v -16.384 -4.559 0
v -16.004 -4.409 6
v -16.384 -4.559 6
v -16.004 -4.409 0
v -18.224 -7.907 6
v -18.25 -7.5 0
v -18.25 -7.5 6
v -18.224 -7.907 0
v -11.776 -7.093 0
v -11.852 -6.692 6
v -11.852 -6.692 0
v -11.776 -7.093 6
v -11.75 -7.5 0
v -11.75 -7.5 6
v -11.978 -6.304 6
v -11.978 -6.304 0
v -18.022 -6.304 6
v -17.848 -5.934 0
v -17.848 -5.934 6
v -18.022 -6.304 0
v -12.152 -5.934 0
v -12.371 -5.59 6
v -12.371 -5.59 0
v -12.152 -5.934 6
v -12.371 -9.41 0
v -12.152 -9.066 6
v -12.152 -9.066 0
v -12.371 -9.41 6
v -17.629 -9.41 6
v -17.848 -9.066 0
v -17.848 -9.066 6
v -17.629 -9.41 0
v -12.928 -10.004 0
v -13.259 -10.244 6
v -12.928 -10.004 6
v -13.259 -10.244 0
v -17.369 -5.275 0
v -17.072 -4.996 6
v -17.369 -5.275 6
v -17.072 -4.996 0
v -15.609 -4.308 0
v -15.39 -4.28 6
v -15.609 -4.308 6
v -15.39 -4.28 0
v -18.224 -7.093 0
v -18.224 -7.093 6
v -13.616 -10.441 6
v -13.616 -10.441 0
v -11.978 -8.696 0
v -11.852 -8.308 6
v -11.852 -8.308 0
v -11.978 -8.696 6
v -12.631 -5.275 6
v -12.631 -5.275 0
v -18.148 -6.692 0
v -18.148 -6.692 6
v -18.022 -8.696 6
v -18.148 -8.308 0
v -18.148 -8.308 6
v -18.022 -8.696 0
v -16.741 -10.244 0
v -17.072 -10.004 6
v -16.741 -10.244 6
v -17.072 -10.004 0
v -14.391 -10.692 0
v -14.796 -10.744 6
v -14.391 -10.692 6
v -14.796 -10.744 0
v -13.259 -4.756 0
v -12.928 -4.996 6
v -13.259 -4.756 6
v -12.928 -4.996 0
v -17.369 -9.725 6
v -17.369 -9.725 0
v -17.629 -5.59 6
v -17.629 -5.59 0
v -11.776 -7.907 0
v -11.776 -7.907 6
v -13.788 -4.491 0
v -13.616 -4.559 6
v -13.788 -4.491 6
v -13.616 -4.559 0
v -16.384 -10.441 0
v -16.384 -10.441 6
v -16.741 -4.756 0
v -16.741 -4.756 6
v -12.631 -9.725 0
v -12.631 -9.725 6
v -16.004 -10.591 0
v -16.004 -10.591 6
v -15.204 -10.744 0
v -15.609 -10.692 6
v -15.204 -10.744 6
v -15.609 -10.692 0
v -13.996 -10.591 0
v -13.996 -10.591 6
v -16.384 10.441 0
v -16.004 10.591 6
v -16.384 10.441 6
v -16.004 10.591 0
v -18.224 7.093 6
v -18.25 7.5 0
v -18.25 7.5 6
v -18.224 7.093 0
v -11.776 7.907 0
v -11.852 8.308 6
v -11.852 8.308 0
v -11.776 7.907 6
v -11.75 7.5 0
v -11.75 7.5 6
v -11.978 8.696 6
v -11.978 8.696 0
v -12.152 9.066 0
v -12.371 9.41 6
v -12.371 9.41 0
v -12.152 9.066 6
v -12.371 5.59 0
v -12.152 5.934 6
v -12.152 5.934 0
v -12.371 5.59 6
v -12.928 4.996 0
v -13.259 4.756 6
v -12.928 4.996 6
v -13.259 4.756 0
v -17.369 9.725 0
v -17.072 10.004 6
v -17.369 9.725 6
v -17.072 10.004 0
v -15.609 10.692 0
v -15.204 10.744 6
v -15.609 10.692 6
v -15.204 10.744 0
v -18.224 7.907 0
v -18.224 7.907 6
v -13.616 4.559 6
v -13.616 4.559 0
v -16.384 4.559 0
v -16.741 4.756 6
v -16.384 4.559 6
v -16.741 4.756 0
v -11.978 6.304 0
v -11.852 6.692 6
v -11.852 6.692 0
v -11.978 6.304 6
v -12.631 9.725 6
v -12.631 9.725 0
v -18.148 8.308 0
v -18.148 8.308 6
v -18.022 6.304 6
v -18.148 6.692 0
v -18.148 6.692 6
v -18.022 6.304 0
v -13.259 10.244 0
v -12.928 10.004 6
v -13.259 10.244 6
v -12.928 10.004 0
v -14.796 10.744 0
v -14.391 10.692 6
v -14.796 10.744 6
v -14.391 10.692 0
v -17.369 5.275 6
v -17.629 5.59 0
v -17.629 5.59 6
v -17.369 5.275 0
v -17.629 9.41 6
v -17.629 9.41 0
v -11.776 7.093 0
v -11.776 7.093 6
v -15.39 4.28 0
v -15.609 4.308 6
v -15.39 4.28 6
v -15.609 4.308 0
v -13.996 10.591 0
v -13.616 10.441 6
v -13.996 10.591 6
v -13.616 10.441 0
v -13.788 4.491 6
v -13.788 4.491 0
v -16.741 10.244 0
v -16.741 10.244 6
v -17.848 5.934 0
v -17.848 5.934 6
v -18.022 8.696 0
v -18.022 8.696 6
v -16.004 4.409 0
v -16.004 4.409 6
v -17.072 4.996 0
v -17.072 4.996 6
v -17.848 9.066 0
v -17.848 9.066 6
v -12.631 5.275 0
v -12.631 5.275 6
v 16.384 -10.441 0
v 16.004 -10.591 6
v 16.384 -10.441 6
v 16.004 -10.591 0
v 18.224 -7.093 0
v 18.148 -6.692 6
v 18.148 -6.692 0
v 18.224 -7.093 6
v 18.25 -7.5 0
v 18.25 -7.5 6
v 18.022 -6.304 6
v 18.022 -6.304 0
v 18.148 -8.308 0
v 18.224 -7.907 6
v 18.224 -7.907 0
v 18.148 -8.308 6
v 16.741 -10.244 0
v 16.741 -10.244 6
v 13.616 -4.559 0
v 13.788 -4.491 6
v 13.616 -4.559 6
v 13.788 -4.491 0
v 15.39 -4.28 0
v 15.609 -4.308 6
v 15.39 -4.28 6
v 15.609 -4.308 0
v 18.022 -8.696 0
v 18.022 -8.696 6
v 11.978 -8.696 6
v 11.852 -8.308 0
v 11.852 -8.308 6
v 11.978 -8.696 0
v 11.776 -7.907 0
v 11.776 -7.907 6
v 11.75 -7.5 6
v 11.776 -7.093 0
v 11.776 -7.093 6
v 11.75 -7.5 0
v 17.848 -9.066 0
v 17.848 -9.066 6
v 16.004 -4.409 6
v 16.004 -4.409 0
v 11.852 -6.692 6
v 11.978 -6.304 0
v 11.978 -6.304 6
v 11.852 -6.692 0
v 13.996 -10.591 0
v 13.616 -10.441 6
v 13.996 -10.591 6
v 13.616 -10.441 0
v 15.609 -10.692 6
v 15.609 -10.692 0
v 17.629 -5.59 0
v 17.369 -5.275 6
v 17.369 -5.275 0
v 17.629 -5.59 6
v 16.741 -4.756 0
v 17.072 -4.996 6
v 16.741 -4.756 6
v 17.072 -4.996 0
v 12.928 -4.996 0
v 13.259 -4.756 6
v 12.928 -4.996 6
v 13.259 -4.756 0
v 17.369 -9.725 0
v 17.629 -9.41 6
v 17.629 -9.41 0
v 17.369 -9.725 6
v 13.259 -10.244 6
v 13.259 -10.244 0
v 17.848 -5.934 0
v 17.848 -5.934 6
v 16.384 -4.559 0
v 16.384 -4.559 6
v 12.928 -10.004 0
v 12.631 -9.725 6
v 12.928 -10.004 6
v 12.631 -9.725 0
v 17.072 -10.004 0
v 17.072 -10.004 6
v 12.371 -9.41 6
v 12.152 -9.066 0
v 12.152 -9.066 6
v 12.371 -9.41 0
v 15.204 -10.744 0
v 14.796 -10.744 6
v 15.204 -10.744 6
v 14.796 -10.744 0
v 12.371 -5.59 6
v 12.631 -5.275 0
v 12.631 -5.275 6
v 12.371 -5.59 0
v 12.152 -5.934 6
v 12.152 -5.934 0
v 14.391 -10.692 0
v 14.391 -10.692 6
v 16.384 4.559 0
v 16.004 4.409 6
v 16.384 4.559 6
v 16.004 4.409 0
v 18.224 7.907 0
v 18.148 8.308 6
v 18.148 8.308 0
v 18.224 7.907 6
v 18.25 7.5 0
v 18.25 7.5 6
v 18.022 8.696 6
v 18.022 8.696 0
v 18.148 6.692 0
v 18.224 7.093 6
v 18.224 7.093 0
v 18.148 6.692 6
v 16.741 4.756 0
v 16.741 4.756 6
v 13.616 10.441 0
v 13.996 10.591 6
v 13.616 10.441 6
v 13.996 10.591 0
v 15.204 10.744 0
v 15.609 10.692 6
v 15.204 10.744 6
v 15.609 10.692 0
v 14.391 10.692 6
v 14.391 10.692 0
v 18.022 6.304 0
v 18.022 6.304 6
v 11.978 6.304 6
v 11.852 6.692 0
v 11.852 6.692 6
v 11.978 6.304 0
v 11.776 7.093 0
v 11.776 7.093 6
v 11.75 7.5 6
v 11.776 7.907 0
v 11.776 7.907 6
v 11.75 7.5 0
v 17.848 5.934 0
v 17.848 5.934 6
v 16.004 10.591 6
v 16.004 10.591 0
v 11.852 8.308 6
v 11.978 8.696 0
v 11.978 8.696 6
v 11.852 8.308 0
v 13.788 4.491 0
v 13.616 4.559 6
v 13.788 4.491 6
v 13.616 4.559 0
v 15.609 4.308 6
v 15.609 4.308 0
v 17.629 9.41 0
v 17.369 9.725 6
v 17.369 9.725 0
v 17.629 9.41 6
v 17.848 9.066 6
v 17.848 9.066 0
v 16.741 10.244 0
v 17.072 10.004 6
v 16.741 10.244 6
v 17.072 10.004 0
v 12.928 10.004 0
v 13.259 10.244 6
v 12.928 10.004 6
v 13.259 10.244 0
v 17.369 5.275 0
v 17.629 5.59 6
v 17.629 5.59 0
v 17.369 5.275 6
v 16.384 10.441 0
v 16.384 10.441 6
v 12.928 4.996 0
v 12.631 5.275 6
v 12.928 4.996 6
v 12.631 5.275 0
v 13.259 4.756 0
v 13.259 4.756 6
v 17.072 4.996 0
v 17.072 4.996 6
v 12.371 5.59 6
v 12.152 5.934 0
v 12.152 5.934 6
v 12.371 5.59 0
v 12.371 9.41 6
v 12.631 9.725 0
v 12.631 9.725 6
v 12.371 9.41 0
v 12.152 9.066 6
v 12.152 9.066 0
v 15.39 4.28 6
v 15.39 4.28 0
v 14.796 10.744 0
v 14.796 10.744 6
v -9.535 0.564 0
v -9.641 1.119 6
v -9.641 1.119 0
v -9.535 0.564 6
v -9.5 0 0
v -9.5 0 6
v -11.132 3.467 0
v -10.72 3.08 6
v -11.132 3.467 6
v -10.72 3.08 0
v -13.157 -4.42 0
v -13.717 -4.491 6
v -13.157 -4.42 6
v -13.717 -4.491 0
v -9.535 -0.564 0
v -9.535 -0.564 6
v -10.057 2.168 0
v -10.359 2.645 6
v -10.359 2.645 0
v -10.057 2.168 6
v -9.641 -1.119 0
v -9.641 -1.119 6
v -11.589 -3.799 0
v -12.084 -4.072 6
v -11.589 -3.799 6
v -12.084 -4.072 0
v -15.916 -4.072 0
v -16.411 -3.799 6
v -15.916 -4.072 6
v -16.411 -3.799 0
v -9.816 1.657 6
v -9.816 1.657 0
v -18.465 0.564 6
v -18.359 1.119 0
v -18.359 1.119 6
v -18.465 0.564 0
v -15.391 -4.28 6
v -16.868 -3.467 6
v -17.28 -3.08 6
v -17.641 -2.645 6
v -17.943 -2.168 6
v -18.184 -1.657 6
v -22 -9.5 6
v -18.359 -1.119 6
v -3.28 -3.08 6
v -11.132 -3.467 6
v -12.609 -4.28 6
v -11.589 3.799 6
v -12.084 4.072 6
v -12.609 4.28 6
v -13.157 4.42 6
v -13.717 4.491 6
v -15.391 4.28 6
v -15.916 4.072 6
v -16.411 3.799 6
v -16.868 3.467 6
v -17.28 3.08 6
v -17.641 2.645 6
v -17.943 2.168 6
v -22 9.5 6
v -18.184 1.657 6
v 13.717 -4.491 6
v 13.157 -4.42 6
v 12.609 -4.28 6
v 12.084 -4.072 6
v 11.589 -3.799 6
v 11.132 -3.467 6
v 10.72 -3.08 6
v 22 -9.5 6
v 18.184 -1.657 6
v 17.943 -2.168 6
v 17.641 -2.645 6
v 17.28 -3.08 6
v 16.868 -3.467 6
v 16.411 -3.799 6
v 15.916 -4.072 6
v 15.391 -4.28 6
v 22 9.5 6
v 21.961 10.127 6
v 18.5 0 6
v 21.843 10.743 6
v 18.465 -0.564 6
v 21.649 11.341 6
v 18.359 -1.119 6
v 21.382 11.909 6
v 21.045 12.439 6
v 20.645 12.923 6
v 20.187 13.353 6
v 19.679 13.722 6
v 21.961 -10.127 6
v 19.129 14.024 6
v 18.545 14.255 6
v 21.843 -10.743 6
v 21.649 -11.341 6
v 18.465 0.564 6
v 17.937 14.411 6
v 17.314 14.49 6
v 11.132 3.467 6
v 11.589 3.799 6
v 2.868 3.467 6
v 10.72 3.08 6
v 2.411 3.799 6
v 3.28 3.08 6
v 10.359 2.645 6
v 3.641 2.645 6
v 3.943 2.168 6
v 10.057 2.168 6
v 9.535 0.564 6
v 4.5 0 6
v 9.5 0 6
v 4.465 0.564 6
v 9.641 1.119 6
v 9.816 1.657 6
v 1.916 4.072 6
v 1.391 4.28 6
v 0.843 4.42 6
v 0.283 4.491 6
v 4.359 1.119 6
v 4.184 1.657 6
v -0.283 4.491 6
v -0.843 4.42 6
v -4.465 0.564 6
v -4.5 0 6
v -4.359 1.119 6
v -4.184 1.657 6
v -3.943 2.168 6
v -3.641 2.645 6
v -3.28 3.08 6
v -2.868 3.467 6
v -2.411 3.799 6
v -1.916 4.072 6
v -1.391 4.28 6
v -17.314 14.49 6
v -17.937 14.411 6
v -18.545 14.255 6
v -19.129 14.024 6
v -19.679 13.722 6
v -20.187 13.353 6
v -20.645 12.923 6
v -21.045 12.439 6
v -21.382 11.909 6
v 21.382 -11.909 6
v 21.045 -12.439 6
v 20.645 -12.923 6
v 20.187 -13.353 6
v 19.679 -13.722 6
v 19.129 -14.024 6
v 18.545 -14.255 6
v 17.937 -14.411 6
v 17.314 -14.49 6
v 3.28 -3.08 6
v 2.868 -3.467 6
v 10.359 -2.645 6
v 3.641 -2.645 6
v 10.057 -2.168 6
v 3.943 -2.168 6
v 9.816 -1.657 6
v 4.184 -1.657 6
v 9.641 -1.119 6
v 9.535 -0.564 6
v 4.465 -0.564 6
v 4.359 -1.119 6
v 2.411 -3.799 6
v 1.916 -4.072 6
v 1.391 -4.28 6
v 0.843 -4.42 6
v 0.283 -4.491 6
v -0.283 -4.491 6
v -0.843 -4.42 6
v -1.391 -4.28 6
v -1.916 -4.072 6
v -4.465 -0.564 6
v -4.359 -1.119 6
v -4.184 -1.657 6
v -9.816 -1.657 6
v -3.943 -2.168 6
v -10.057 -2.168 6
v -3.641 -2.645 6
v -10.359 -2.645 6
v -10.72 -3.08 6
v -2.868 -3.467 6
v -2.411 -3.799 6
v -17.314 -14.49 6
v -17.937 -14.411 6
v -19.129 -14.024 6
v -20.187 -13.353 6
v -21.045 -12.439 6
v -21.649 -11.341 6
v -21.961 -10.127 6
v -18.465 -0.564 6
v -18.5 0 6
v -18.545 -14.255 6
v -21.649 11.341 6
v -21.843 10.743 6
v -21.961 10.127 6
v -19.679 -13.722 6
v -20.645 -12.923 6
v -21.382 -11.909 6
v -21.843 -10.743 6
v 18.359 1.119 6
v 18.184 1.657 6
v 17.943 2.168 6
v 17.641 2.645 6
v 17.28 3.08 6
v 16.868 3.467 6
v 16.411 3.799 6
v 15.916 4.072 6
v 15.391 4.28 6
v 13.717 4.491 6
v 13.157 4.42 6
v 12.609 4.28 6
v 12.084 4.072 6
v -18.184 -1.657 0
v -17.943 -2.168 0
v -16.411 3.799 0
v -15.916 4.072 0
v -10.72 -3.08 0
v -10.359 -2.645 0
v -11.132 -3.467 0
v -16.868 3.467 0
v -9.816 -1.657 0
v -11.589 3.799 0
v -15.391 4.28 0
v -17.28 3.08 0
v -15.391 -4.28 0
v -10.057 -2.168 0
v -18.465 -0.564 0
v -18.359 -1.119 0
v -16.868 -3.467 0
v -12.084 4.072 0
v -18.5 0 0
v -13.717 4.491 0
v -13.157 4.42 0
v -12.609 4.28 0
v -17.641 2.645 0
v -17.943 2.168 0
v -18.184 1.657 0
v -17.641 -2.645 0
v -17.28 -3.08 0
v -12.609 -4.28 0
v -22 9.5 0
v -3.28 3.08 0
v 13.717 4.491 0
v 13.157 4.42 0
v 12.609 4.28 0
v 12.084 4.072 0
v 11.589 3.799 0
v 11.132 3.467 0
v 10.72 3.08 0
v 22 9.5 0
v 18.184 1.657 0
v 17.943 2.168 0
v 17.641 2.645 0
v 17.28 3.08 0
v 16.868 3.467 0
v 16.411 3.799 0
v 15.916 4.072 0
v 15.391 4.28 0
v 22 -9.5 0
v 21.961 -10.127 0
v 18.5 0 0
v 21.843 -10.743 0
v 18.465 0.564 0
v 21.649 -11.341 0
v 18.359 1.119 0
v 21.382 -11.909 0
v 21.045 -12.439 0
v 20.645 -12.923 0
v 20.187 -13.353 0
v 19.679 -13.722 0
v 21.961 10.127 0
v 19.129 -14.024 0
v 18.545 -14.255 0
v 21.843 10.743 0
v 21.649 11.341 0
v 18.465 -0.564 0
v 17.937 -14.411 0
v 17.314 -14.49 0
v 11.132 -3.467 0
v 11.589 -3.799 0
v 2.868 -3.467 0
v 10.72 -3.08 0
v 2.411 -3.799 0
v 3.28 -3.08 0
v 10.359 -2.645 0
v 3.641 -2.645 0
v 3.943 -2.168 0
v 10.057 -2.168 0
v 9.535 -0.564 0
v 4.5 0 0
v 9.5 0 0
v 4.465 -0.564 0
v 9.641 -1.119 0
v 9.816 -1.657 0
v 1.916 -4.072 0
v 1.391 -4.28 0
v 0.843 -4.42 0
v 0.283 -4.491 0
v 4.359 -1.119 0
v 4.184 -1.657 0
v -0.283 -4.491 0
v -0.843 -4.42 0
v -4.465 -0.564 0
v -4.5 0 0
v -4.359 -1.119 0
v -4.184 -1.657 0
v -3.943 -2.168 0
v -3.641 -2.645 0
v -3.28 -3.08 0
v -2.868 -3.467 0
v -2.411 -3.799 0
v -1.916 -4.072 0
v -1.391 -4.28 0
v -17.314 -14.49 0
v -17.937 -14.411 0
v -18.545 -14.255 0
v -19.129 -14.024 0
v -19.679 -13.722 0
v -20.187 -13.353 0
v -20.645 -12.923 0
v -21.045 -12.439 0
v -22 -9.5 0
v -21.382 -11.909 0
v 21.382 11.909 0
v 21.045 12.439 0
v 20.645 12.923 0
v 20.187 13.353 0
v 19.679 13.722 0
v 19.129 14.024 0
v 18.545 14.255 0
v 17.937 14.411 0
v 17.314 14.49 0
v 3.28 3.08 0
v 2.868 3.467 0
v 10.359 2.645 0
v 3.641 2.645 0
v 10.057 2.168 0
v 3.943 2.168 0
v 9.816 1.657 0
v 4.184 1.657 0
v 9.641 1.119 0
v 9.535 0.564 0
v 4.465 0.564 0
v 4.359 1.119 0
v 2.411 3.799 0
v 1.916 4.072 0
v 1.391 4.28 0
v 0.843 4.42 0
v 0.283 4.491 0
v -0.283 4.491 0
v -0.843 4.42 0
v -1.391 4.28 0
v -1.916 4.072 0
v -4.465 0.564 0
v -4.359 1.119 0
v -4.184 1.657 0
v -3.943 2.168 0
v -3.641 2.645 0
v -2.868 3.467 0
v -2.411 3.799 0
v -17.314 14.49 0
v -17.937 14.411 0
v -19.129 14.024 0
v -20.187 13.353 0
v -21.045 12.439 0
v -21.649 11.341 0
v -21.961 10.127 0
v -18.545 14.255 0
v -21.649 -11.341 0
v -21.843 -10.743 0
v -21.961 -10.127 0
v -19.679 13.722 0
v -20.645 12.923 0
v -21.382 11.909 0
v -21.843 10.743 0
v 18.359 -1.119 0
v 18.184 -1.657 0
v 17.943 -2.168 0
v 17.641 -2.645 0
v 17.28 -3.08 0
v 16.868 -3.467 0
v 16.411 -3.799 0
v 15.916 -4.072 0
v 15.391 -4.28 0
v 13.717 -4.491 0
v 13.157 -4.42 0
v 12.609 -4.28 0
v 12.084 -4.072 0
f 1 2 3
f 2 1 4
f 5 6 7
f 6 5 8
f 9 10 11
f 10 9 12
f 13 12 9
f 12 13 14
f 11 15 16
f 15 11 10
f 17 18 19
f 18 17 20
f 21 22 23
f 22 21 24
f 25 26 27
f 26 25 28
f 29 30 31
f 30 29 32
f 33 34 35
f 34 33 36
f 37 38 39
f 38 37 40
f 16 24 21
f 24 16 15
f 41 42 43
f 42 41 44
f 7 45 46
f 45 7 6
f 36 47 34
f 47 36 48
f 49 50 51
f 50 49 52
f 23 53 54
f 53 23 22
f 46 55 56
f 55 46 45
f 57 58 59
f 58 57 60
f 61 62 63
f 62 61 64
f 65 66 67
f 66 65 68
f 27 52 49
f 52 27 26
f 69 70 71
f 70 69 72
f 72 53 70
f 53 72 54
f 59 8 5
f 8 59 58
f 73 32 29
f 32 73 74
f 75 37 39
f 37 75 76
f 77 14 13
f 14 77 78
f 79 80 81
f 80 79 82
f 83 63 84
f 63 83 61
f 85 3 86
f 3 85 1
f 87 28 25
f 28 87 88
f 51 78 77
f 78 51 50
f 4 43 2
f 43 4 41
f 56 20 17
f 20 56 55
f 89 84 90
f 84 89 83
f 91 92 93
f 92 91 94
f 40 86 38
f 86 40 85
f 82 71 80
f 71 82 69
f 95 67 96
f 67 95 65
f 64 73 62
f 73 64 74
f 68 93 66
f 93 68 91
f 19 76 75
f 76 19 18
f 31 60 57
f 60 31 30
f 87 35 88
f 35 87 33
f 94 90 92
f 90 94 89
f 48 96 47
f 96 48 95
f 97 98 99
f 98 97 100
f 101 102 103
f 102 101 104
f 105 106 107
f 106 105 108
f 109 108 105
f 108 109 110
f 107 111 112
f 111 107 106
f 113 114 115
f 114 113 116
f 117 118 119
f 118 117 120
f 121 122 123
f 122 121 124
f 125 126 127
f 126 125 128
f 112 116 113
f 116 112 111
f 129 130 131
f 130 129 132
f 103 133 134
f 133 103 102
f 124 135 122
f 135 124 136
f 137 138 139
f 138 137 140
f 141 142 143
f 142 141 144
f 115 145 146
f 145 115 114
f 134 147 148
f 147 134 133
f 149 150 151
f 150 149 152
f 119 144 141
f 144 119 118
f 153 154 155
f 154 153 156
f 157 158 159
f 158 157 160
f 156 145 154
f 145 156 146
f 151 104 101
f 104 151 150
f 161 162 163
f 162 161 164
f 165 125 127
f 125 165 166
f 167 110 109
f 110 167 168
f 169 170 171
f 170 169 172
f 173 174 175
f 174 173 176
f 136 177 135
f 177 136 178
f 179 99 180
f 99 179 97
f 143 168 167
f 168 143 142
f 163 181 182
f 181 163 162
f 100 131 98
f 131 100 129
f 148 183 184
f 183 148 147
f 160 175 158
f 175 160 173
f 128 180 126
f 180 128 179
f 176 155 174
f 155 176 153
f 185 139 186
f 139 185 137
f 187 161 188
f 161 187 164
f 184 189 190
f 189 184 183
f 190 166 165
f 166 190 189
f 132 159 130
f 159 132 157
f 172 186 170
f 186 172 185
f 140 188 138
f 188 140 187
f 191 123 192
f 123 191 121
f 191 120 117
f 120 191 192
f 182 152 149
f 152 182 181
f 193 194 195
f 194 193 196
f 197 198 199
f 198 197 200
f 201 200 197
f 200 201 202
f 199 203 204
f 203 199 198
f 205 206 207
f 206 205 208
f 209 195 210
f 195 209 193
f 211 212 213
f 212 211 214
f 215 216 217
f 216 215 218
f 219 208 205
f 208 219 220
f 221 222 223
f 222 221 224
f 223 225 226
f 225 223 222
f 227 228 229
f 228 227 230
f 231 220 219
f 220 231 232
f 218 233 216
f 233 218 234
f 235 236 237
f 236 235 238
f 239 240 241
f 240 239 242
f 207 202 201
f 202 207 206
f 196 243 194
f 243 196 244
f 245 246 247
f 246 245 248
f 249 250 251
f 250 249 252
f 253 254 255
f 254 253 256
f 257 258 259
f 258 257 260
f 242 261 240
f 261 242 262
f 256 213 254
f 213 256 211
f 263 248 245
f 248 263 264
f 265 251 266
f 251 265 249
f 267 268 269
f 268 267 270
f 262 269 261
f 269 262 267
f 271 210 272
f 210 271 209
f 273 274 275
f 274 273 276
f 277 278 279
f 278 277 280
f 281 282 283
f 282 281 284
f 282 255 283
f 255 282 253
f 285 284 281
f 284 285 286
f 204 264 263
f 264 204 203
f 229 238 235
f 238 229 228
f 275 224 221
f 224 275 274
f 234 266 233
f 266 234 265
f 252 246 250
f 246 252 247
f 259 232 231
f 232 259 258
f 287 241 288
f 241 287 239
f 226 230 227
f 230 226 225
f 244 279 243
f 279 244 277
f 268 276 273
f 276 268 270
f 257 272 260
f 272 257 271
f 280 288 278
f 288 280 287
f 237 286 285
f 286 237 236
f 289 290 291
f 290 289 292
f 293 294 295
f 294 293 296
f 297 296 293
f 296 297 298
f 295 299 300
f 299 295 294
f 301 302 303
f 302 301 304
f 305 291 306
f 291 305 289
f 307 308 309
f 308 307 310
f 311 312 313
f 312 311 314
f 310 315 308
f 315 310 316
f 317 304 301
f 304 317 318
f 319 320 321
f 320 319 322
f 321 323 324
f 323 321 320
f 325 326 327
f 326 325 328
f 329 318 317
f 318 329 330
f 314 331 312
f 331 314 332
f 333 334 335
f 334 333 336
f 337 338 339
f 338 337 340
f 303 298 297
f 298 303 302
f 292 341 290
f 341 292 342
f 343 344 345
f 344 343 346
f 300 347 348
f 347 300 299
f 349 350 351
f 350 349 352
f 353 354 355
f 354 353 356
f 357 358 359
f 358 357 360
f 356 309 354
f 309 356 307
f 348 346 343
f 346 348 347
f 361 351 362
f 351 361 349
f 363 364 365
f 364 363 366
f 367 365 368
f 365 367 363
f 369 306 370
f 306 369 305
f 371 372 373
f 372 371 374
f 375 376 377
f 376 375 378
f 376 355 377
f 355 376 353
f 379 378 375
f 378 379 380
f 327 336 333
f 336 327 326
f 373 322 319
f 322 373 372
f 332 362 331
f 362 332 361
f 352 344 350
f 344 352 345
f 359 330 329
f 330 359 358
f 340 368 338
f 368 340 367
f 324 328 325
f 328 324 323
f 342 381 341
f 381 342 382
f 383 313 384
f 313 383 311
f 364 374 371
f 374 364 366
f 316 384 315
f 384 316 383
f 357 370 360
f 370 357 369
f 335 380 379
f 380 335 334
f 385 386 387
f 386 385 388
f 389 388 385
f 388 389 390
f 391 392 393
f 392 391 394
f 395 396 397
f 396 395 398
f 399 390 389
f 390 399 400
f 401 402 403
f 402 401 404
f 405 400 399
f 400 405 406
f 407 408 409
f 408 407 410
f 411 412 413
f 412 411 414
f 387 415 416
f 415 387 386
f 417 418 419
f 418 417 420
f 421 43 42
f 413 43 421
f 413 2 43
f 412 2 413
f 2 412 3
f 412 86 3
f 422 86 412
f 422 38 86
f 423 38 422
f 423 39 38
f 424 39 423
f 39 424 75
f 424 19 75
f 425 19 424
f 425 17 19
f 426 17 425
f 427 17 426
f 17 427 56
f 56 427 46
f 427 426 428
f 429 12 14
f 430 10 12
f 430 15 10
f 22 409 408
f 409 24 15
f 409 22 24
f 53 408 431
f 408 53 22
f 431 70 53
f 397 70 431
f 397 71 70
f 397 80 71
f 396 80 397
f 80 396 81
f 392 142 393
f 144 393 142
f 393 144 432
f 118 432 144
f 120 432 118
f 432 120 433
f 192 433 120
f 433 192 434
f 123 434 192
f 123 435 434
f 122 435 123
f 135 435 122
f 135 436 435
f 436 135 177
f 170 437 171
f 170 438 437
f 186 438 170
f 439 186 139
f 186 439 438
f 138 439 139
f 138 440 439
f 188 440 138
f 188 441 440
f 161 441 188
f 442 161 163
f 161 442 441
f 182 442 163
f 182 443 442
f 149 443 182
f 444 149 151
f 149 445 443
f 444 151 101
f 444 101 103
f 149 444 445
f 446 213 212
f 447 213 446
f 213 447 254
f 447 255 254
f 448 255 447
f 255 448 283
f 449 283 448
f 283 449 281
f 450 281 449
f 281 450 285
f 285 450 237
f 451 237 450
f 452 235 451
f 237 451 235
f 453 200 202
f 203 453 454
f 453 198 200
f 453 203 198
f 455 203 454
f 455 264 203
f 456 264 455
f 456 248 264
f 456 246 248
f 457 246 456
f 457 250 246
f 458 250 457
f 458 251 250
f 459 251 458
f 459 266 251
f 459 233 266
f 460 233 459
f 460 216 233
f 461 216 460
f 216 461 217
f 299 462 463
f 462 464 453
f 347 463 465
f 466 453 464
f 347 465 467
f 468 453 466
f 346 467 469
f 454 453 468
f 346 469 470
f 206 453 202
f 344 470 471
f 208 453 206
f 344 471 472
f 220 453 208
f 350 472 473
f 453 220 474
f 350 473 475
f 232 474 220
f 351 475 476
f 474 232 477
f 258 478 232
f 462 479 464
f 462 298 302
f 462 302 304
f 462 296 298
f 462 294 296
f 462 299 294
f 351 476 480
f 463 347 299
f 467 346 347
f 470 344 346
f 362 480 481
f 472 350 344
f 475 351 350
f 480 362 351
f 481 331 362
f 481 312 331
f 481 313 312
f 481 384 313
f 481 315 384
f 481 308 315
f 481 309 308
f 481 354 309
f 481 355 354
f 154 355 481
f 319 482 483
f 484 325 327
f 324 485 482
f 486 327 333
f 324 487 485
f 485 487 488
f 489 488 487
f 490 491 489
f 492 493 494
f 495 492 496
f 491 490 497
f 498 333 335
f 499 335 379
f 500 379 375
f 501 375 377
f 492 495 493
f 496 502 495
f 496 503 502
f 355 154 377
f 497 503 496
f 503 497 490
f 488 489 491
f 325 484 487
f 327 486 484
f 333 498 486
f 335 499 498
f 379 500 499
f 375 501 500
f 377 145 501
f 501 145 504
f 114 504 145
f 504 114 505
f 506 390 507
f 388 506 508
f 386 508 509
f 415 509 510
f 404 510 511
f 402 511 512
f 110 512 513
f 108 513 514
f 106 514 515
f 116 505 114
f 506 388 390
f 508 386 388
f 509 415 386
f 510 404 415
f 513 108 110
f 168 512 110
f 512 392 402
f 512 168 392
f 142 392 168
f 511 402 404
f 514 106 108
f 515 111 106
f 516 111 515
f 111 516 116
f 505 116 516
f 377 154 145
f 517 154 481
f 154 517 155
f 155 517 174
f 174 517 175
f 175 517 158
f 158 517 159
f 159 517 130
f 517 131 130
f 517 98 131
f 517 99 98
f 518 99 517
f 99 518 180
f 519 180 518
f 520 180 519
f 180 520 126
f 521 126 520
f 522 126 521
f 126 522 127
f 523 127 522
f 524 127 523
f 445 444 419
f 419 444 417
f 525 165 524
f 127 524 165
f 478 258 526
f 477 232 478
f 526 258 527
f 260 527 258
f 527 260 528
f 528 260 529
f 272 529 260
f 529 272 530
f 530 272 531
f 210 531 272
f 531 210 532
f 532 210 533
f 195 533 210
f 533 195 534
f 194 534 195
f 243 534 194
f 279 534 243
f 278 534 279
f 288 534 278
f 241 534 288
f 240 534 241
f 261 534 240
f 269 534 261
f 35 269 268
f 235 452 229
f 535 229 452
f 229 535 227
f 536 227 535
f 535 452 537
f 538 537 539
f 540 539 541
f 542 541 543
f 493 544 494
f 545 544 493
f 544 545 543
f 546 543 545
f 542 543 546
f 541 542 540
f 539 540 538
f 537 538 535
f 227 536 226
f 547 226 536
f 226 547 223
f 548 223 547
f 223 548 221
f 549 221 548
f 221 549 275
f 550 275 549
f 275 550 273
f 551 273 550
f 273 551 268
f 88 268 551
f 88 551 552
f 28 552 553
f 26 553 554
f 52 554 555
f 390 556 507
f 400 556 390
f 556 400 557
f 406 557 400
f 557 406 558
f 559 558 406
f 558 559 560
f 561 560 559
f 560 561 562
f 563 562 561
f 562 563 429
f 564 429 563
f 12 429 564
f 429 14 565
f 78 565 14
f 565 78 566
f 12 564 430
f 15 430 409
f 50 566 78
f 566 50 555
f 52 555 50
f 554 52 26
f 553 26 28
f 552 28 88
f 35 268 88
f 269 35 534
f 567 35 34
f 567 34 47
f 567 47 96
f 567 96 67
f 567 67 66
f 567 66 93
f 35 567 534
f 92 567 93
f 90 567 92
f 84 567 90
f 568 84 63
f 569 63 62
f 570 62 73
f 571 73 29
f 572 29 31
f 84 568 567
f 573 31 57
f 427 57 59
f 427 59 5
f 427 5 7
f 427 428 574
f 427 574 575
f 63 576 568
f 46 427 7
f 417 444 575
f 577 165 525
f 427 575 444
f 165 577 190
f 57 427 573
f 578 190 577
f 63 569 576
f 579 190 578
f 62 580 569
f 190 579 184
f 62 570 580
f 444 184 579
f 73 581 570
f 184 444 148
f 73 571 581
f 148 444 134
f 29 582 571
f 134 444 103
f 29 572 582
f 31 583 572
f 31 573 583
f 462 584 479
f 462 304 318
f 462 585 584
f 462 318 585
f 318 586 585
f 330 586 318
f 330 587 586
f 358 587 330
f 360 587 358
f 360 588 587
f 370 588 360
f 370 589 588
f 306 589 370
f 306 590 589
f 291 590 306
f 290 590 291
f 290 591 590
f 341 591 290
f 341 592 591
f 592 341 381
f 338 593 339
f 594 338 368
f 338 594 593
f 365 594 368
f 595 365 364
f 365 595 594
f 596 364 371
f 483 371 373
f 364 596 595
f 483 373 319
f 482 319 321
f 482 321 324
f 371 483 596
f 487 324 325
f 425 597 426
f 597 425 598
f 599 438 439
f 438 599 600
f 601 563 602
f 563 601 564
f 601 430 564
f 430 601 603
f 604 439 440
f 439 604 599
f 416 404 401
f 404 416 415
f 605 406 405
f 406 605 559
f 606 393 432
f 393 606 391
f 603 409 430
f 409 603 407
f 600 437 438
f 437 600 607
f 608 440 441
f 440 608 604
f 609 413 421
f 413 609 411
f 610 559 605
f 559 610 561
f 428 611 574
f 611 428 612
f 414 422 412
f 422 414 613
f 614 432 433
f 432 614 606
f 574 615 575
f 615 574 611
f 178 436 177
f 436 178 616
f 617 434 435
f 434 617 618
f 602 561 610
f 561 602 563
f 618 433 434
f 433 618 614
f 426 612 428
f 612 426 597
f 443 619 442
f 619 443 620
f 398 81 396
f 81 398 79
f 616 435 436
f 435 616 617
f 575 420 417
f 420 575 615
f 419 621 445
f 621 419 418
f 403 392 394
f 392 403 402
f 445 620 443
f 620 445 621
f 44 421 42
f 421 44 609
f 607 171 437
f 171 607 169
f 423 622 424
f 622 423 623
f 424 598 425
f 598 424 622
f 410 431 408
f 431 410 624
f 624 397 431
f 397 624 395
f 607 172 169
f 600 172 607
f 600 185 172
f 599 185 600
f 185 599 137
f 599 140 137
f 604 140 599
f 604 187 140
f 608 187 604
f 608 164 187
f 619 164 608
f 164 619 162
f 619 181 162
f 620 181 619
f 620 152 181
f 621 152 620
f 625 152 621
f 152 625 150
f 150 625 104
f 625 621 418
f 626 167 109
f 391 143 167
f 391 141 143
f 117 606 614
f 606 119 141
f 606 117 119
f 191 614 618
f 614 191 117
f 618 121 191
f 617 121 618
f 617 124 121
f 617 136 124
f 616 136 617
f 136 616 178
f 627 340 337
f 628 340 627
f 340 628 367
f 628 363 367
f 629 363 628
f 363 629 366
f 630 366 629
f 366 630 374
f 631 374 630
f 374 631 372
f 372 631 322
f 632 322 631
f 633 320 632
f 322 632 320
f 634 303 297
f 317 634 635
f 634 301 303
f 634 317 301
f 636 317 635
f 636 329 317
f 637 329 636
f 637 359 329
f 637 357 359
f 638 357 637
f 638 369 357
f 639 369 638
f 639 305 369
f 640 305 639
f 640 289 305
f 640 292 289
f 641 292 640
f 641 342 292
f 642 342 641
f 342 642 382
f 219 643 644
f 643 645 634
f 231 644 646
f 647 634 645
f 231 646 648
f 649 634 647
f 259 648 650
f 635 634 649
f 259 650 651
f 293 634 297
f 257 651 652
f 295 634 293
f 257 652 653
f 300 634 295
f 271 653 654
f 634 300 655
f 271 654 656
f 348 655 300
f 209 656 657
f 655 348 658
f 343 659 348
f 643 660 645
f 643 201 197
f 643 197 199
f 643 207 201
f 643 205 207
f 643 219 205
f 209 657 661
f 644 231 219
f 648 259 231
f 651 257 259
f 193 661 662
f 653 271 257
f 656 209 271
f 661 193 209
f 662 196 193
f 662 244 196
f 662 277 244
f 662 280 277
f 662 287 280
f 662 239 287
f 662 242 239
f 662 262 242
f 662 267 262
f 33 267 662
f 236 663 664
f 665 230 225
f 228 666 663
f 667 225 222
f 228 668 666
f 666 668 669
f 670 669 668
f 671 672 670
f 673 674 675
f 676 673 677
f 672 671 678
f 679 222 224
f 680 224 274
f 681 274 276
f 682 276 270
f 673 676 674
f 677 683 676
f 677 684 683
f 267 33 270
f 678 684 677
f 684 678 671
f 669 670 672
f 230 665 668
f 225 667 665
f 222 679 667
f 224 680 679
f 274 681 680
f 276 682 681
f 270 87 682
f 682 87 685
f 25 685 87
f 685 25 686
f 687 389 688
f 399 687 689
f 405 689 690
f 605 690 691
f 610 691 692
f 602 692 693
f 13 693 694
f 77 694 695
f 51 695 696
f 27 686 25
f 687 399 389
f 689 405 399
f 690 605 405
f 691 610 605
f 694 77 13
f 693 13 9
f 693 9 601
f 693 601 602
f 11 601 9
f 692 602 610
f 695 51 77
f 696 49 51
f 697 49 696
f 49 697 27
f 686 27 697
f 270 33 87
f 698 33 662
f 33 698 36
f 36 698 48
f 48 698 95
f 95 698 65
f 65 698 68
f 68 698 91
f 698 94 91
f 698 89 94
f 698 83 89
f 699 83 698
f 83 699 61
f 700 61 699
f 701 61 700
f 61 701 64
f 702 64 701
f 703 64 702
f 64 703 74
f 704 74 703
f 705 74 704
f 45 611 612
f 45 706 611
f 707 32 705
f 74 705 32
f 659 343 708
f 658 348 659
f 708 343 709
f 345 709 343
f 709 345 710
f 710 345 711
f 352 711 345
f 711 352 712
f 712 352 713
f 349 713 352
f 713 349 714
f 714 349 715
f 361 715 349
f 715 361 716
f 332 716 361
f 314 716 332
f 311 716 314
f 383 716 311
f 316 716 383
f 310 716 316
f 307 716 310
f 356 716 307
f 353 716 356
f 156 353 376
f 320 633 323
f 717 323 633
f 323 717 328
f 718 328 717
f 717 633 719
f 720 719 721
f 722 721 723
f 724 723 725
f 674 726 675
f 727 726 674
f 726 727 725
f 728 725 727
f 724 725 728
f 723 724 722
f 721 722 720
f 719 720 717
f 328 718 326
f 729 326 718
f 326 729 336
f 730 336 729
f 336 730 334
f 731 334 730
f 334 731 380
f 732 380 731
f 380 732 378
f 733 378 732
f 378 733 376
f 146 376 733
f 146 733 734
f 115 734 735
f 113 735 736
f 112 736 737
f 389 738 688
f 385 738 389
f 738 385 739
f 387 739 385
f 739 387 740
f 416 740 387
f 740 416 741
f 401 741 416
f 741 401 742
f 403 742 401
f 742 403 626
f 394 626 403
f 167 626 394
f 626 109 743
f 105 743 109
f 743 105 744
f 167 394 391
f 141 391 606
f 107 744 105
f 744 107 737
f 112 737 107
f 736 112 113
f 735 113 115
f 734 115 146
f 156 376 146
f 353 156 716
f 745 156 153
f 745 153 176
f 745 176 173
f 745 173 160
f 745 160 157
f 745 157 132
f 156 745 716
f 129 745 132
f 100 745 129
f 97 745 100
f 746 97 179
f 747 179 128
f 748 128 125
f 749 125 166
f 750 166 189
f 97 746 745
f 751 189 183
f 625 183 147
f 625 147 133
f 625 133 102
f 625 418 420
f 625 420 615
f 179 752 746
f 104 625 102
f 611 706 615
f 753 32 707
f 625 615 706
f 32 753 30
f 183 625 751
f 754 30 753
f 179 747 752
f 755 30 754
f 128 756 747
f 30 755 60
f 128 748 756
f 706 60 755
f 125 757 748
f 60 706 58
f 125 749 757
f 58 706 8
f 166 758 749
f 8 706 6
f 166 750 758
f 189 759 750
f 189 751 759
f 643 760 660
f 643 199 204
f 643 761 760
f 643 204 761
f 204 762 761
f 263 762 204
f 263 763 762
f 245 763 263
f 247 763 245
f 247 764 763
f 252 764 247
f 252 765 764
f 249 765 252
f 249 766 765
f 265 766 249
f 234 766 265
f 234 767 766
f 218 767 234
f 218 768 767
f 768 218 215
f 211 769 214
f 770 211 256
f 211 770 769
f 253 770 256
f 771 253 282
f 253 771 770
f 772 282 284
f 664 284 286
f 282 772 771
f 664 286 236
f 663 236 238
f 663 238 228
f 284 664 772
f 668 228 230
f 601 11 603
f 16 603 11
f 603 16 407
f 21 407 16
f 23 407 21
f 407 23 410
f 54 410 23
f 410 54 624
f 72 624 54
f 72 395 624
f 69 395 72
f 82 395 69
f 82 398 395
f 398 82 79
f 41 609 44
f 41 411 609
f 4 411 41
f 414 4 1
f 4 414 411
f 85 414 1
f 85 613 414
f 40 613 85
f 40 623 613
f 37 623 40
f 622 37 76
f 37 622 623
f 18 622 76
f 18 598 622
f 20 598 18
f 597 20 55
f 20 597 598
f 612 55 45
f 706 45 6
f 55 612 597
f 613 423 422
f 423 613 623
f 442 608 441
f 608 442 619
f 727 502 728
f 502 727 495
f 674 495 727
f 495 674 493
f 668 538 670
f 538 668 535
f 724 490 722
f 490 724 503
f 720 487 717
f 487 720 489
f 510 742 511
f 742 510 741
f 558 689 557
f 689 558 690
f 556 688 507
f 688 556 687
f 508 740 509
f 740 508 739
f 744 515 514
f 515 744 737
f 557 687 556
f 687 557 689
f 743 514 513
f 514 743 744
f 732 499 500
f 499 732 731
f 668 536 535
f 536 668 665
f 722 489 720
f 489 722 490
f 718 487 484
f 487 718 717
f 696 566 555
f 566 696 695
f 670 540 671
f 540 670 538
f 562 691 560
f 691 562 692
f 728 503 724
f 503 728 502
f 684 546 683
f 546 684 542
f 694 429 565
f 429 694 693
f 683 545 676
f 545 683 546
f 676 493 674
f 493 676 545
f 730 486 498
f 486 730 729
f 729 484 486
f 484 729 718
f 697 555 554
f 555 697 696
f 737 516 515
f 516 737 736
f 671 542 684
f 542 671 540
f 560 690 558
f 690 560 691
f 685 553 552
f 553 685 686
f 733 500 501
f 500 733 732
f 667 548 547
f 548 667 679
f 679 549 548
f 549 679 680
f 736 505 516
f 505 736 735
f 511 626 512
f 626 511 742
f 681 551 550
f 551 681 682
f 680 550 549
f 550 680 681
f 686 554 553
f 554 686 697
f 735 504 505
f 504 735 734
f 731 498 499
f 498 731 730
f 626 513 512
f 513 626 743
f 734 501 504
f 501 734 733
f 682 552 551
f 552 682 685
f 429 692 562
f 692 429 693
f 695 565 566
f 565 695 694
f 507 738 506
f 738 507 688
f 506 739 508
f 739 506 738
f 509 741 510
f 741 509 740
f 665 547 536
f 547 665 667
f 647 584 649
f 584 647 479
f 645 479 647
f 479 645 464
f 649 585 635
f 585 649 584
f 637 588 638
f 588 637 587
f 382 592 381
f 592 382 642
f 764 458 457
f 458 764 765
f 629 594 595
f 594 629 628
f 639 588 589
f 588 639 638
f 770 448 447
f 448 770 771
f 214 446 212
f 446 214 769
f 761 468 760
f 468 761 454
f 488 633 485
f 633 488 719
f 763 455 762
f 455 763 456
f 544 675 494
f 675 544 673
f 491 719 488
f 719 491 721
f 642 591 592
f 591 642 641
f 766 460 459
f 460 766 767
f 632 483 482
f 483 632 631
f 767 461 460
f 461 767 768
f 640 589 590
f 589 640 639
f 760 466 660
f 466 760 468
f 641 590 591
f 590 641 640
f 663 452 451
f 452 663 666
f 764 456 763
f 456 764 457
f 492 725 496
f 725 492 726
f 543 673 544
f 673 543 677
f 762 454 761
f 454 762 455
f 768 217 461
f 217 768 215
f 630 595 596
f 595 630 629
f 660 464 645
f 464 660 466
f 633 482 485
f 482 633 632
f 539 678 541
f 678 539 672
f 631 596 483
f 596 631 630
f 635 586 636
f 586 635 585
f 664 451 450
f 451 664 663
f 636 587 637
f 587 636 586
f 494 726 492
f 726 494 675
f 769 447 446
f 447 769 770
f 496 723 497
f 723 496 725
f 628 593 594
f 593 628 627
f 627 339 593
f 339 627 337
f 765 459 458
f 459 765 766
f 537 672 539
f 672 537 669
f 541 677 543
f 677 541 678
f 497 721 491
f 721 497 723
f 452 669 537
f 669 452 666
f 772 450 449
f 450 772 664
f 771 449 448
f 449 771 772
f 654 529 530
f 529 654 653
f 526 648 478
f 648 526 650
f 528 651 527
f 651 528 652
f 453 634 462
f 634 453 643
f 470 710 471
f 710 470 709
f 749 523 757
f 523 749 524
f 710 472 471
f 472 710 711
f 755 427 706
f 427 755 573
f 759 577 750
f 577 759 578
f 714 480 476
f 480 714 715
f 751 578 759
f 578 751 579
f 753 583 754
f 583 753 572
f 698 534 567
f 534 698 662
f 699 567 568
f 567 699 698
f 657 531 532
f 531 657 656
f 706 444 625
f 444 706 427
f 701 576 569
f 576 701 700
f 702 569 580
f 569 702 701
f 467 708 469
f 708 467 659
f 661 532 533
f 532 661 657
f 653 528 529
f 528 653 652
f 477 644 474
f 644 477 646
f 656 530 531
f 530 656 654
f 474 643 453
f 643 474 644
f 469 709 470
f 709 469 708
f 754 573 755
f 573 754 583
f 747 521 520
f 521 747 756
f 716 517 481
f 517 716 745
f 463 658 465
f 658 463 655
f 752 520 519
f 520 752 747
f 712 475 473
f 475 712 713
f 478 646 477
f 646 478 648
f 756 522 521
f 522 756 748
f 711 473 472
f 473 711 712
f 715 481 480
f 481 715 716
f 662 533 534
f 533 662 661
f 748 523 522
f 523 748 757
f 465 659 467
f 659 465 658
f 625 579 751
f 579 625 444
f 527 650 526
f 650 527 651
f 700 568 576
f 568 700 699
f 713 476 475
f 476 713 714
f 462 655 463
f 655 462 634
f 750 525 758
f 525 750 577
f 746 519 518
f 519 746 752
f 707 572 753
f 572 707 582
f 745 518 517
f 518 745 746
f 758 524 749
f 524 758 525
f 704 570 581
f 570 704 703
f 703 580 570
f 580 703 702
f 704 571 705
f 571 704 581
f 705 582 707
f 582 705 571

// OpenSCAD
$fn = 50;


difference() {
	union() {
		hull() {
			translate(v = [-17.0000000000, 9.5000000000, 0]) {
				cylinder(h = 6, r = 5);
			}
			translate(v = [17.0000000000, 9.5000000000, 0]) {
				cylinder(h = 6, r = 5);
			}
			translate(v = [-17.0000000000, -9.5000000000, 0]) {
				cylinder(h = 6, r = 5);
			}
			translate(v = [17.0000000000, -9.5000000000, 0]) {
				cylinder(h = 6, r = 5);
			}
		}
	}
	union() {
		#translate(v = [-15.0000000000, -7.5000000000, -100.0000000000]) {
			cylinder(h = 200, r = 3.2500000000);
		}
		#translate(v = [-15.0000000000, 7.5000000000, -100.0000000000]) {
			cylinder(h = 200, r = 3.2500000000);
		}
		#translate(v = [15.0000000000, -7.5000000000, -100.0000000000]) {
			cylinder(h = 200, r = 3.2500000000);
		}
		#translate(v = [15.0000000000, 7.5000000000, -100.0000000000]) {
			cylinder(h = 200, r = 3.2500000000);
		}
		#translate(v = [-14.0000000000, 0, 0]) {
			cylinder(h = 6, r = 4.5000000000);
		}
		#cylinder(h = 6, r = 4.5000000000);
		#translate(v = [14.0000000000, 0, 0]) {
			cylinder(h = 6, r = 4.5000000000);
		}
	}
}
